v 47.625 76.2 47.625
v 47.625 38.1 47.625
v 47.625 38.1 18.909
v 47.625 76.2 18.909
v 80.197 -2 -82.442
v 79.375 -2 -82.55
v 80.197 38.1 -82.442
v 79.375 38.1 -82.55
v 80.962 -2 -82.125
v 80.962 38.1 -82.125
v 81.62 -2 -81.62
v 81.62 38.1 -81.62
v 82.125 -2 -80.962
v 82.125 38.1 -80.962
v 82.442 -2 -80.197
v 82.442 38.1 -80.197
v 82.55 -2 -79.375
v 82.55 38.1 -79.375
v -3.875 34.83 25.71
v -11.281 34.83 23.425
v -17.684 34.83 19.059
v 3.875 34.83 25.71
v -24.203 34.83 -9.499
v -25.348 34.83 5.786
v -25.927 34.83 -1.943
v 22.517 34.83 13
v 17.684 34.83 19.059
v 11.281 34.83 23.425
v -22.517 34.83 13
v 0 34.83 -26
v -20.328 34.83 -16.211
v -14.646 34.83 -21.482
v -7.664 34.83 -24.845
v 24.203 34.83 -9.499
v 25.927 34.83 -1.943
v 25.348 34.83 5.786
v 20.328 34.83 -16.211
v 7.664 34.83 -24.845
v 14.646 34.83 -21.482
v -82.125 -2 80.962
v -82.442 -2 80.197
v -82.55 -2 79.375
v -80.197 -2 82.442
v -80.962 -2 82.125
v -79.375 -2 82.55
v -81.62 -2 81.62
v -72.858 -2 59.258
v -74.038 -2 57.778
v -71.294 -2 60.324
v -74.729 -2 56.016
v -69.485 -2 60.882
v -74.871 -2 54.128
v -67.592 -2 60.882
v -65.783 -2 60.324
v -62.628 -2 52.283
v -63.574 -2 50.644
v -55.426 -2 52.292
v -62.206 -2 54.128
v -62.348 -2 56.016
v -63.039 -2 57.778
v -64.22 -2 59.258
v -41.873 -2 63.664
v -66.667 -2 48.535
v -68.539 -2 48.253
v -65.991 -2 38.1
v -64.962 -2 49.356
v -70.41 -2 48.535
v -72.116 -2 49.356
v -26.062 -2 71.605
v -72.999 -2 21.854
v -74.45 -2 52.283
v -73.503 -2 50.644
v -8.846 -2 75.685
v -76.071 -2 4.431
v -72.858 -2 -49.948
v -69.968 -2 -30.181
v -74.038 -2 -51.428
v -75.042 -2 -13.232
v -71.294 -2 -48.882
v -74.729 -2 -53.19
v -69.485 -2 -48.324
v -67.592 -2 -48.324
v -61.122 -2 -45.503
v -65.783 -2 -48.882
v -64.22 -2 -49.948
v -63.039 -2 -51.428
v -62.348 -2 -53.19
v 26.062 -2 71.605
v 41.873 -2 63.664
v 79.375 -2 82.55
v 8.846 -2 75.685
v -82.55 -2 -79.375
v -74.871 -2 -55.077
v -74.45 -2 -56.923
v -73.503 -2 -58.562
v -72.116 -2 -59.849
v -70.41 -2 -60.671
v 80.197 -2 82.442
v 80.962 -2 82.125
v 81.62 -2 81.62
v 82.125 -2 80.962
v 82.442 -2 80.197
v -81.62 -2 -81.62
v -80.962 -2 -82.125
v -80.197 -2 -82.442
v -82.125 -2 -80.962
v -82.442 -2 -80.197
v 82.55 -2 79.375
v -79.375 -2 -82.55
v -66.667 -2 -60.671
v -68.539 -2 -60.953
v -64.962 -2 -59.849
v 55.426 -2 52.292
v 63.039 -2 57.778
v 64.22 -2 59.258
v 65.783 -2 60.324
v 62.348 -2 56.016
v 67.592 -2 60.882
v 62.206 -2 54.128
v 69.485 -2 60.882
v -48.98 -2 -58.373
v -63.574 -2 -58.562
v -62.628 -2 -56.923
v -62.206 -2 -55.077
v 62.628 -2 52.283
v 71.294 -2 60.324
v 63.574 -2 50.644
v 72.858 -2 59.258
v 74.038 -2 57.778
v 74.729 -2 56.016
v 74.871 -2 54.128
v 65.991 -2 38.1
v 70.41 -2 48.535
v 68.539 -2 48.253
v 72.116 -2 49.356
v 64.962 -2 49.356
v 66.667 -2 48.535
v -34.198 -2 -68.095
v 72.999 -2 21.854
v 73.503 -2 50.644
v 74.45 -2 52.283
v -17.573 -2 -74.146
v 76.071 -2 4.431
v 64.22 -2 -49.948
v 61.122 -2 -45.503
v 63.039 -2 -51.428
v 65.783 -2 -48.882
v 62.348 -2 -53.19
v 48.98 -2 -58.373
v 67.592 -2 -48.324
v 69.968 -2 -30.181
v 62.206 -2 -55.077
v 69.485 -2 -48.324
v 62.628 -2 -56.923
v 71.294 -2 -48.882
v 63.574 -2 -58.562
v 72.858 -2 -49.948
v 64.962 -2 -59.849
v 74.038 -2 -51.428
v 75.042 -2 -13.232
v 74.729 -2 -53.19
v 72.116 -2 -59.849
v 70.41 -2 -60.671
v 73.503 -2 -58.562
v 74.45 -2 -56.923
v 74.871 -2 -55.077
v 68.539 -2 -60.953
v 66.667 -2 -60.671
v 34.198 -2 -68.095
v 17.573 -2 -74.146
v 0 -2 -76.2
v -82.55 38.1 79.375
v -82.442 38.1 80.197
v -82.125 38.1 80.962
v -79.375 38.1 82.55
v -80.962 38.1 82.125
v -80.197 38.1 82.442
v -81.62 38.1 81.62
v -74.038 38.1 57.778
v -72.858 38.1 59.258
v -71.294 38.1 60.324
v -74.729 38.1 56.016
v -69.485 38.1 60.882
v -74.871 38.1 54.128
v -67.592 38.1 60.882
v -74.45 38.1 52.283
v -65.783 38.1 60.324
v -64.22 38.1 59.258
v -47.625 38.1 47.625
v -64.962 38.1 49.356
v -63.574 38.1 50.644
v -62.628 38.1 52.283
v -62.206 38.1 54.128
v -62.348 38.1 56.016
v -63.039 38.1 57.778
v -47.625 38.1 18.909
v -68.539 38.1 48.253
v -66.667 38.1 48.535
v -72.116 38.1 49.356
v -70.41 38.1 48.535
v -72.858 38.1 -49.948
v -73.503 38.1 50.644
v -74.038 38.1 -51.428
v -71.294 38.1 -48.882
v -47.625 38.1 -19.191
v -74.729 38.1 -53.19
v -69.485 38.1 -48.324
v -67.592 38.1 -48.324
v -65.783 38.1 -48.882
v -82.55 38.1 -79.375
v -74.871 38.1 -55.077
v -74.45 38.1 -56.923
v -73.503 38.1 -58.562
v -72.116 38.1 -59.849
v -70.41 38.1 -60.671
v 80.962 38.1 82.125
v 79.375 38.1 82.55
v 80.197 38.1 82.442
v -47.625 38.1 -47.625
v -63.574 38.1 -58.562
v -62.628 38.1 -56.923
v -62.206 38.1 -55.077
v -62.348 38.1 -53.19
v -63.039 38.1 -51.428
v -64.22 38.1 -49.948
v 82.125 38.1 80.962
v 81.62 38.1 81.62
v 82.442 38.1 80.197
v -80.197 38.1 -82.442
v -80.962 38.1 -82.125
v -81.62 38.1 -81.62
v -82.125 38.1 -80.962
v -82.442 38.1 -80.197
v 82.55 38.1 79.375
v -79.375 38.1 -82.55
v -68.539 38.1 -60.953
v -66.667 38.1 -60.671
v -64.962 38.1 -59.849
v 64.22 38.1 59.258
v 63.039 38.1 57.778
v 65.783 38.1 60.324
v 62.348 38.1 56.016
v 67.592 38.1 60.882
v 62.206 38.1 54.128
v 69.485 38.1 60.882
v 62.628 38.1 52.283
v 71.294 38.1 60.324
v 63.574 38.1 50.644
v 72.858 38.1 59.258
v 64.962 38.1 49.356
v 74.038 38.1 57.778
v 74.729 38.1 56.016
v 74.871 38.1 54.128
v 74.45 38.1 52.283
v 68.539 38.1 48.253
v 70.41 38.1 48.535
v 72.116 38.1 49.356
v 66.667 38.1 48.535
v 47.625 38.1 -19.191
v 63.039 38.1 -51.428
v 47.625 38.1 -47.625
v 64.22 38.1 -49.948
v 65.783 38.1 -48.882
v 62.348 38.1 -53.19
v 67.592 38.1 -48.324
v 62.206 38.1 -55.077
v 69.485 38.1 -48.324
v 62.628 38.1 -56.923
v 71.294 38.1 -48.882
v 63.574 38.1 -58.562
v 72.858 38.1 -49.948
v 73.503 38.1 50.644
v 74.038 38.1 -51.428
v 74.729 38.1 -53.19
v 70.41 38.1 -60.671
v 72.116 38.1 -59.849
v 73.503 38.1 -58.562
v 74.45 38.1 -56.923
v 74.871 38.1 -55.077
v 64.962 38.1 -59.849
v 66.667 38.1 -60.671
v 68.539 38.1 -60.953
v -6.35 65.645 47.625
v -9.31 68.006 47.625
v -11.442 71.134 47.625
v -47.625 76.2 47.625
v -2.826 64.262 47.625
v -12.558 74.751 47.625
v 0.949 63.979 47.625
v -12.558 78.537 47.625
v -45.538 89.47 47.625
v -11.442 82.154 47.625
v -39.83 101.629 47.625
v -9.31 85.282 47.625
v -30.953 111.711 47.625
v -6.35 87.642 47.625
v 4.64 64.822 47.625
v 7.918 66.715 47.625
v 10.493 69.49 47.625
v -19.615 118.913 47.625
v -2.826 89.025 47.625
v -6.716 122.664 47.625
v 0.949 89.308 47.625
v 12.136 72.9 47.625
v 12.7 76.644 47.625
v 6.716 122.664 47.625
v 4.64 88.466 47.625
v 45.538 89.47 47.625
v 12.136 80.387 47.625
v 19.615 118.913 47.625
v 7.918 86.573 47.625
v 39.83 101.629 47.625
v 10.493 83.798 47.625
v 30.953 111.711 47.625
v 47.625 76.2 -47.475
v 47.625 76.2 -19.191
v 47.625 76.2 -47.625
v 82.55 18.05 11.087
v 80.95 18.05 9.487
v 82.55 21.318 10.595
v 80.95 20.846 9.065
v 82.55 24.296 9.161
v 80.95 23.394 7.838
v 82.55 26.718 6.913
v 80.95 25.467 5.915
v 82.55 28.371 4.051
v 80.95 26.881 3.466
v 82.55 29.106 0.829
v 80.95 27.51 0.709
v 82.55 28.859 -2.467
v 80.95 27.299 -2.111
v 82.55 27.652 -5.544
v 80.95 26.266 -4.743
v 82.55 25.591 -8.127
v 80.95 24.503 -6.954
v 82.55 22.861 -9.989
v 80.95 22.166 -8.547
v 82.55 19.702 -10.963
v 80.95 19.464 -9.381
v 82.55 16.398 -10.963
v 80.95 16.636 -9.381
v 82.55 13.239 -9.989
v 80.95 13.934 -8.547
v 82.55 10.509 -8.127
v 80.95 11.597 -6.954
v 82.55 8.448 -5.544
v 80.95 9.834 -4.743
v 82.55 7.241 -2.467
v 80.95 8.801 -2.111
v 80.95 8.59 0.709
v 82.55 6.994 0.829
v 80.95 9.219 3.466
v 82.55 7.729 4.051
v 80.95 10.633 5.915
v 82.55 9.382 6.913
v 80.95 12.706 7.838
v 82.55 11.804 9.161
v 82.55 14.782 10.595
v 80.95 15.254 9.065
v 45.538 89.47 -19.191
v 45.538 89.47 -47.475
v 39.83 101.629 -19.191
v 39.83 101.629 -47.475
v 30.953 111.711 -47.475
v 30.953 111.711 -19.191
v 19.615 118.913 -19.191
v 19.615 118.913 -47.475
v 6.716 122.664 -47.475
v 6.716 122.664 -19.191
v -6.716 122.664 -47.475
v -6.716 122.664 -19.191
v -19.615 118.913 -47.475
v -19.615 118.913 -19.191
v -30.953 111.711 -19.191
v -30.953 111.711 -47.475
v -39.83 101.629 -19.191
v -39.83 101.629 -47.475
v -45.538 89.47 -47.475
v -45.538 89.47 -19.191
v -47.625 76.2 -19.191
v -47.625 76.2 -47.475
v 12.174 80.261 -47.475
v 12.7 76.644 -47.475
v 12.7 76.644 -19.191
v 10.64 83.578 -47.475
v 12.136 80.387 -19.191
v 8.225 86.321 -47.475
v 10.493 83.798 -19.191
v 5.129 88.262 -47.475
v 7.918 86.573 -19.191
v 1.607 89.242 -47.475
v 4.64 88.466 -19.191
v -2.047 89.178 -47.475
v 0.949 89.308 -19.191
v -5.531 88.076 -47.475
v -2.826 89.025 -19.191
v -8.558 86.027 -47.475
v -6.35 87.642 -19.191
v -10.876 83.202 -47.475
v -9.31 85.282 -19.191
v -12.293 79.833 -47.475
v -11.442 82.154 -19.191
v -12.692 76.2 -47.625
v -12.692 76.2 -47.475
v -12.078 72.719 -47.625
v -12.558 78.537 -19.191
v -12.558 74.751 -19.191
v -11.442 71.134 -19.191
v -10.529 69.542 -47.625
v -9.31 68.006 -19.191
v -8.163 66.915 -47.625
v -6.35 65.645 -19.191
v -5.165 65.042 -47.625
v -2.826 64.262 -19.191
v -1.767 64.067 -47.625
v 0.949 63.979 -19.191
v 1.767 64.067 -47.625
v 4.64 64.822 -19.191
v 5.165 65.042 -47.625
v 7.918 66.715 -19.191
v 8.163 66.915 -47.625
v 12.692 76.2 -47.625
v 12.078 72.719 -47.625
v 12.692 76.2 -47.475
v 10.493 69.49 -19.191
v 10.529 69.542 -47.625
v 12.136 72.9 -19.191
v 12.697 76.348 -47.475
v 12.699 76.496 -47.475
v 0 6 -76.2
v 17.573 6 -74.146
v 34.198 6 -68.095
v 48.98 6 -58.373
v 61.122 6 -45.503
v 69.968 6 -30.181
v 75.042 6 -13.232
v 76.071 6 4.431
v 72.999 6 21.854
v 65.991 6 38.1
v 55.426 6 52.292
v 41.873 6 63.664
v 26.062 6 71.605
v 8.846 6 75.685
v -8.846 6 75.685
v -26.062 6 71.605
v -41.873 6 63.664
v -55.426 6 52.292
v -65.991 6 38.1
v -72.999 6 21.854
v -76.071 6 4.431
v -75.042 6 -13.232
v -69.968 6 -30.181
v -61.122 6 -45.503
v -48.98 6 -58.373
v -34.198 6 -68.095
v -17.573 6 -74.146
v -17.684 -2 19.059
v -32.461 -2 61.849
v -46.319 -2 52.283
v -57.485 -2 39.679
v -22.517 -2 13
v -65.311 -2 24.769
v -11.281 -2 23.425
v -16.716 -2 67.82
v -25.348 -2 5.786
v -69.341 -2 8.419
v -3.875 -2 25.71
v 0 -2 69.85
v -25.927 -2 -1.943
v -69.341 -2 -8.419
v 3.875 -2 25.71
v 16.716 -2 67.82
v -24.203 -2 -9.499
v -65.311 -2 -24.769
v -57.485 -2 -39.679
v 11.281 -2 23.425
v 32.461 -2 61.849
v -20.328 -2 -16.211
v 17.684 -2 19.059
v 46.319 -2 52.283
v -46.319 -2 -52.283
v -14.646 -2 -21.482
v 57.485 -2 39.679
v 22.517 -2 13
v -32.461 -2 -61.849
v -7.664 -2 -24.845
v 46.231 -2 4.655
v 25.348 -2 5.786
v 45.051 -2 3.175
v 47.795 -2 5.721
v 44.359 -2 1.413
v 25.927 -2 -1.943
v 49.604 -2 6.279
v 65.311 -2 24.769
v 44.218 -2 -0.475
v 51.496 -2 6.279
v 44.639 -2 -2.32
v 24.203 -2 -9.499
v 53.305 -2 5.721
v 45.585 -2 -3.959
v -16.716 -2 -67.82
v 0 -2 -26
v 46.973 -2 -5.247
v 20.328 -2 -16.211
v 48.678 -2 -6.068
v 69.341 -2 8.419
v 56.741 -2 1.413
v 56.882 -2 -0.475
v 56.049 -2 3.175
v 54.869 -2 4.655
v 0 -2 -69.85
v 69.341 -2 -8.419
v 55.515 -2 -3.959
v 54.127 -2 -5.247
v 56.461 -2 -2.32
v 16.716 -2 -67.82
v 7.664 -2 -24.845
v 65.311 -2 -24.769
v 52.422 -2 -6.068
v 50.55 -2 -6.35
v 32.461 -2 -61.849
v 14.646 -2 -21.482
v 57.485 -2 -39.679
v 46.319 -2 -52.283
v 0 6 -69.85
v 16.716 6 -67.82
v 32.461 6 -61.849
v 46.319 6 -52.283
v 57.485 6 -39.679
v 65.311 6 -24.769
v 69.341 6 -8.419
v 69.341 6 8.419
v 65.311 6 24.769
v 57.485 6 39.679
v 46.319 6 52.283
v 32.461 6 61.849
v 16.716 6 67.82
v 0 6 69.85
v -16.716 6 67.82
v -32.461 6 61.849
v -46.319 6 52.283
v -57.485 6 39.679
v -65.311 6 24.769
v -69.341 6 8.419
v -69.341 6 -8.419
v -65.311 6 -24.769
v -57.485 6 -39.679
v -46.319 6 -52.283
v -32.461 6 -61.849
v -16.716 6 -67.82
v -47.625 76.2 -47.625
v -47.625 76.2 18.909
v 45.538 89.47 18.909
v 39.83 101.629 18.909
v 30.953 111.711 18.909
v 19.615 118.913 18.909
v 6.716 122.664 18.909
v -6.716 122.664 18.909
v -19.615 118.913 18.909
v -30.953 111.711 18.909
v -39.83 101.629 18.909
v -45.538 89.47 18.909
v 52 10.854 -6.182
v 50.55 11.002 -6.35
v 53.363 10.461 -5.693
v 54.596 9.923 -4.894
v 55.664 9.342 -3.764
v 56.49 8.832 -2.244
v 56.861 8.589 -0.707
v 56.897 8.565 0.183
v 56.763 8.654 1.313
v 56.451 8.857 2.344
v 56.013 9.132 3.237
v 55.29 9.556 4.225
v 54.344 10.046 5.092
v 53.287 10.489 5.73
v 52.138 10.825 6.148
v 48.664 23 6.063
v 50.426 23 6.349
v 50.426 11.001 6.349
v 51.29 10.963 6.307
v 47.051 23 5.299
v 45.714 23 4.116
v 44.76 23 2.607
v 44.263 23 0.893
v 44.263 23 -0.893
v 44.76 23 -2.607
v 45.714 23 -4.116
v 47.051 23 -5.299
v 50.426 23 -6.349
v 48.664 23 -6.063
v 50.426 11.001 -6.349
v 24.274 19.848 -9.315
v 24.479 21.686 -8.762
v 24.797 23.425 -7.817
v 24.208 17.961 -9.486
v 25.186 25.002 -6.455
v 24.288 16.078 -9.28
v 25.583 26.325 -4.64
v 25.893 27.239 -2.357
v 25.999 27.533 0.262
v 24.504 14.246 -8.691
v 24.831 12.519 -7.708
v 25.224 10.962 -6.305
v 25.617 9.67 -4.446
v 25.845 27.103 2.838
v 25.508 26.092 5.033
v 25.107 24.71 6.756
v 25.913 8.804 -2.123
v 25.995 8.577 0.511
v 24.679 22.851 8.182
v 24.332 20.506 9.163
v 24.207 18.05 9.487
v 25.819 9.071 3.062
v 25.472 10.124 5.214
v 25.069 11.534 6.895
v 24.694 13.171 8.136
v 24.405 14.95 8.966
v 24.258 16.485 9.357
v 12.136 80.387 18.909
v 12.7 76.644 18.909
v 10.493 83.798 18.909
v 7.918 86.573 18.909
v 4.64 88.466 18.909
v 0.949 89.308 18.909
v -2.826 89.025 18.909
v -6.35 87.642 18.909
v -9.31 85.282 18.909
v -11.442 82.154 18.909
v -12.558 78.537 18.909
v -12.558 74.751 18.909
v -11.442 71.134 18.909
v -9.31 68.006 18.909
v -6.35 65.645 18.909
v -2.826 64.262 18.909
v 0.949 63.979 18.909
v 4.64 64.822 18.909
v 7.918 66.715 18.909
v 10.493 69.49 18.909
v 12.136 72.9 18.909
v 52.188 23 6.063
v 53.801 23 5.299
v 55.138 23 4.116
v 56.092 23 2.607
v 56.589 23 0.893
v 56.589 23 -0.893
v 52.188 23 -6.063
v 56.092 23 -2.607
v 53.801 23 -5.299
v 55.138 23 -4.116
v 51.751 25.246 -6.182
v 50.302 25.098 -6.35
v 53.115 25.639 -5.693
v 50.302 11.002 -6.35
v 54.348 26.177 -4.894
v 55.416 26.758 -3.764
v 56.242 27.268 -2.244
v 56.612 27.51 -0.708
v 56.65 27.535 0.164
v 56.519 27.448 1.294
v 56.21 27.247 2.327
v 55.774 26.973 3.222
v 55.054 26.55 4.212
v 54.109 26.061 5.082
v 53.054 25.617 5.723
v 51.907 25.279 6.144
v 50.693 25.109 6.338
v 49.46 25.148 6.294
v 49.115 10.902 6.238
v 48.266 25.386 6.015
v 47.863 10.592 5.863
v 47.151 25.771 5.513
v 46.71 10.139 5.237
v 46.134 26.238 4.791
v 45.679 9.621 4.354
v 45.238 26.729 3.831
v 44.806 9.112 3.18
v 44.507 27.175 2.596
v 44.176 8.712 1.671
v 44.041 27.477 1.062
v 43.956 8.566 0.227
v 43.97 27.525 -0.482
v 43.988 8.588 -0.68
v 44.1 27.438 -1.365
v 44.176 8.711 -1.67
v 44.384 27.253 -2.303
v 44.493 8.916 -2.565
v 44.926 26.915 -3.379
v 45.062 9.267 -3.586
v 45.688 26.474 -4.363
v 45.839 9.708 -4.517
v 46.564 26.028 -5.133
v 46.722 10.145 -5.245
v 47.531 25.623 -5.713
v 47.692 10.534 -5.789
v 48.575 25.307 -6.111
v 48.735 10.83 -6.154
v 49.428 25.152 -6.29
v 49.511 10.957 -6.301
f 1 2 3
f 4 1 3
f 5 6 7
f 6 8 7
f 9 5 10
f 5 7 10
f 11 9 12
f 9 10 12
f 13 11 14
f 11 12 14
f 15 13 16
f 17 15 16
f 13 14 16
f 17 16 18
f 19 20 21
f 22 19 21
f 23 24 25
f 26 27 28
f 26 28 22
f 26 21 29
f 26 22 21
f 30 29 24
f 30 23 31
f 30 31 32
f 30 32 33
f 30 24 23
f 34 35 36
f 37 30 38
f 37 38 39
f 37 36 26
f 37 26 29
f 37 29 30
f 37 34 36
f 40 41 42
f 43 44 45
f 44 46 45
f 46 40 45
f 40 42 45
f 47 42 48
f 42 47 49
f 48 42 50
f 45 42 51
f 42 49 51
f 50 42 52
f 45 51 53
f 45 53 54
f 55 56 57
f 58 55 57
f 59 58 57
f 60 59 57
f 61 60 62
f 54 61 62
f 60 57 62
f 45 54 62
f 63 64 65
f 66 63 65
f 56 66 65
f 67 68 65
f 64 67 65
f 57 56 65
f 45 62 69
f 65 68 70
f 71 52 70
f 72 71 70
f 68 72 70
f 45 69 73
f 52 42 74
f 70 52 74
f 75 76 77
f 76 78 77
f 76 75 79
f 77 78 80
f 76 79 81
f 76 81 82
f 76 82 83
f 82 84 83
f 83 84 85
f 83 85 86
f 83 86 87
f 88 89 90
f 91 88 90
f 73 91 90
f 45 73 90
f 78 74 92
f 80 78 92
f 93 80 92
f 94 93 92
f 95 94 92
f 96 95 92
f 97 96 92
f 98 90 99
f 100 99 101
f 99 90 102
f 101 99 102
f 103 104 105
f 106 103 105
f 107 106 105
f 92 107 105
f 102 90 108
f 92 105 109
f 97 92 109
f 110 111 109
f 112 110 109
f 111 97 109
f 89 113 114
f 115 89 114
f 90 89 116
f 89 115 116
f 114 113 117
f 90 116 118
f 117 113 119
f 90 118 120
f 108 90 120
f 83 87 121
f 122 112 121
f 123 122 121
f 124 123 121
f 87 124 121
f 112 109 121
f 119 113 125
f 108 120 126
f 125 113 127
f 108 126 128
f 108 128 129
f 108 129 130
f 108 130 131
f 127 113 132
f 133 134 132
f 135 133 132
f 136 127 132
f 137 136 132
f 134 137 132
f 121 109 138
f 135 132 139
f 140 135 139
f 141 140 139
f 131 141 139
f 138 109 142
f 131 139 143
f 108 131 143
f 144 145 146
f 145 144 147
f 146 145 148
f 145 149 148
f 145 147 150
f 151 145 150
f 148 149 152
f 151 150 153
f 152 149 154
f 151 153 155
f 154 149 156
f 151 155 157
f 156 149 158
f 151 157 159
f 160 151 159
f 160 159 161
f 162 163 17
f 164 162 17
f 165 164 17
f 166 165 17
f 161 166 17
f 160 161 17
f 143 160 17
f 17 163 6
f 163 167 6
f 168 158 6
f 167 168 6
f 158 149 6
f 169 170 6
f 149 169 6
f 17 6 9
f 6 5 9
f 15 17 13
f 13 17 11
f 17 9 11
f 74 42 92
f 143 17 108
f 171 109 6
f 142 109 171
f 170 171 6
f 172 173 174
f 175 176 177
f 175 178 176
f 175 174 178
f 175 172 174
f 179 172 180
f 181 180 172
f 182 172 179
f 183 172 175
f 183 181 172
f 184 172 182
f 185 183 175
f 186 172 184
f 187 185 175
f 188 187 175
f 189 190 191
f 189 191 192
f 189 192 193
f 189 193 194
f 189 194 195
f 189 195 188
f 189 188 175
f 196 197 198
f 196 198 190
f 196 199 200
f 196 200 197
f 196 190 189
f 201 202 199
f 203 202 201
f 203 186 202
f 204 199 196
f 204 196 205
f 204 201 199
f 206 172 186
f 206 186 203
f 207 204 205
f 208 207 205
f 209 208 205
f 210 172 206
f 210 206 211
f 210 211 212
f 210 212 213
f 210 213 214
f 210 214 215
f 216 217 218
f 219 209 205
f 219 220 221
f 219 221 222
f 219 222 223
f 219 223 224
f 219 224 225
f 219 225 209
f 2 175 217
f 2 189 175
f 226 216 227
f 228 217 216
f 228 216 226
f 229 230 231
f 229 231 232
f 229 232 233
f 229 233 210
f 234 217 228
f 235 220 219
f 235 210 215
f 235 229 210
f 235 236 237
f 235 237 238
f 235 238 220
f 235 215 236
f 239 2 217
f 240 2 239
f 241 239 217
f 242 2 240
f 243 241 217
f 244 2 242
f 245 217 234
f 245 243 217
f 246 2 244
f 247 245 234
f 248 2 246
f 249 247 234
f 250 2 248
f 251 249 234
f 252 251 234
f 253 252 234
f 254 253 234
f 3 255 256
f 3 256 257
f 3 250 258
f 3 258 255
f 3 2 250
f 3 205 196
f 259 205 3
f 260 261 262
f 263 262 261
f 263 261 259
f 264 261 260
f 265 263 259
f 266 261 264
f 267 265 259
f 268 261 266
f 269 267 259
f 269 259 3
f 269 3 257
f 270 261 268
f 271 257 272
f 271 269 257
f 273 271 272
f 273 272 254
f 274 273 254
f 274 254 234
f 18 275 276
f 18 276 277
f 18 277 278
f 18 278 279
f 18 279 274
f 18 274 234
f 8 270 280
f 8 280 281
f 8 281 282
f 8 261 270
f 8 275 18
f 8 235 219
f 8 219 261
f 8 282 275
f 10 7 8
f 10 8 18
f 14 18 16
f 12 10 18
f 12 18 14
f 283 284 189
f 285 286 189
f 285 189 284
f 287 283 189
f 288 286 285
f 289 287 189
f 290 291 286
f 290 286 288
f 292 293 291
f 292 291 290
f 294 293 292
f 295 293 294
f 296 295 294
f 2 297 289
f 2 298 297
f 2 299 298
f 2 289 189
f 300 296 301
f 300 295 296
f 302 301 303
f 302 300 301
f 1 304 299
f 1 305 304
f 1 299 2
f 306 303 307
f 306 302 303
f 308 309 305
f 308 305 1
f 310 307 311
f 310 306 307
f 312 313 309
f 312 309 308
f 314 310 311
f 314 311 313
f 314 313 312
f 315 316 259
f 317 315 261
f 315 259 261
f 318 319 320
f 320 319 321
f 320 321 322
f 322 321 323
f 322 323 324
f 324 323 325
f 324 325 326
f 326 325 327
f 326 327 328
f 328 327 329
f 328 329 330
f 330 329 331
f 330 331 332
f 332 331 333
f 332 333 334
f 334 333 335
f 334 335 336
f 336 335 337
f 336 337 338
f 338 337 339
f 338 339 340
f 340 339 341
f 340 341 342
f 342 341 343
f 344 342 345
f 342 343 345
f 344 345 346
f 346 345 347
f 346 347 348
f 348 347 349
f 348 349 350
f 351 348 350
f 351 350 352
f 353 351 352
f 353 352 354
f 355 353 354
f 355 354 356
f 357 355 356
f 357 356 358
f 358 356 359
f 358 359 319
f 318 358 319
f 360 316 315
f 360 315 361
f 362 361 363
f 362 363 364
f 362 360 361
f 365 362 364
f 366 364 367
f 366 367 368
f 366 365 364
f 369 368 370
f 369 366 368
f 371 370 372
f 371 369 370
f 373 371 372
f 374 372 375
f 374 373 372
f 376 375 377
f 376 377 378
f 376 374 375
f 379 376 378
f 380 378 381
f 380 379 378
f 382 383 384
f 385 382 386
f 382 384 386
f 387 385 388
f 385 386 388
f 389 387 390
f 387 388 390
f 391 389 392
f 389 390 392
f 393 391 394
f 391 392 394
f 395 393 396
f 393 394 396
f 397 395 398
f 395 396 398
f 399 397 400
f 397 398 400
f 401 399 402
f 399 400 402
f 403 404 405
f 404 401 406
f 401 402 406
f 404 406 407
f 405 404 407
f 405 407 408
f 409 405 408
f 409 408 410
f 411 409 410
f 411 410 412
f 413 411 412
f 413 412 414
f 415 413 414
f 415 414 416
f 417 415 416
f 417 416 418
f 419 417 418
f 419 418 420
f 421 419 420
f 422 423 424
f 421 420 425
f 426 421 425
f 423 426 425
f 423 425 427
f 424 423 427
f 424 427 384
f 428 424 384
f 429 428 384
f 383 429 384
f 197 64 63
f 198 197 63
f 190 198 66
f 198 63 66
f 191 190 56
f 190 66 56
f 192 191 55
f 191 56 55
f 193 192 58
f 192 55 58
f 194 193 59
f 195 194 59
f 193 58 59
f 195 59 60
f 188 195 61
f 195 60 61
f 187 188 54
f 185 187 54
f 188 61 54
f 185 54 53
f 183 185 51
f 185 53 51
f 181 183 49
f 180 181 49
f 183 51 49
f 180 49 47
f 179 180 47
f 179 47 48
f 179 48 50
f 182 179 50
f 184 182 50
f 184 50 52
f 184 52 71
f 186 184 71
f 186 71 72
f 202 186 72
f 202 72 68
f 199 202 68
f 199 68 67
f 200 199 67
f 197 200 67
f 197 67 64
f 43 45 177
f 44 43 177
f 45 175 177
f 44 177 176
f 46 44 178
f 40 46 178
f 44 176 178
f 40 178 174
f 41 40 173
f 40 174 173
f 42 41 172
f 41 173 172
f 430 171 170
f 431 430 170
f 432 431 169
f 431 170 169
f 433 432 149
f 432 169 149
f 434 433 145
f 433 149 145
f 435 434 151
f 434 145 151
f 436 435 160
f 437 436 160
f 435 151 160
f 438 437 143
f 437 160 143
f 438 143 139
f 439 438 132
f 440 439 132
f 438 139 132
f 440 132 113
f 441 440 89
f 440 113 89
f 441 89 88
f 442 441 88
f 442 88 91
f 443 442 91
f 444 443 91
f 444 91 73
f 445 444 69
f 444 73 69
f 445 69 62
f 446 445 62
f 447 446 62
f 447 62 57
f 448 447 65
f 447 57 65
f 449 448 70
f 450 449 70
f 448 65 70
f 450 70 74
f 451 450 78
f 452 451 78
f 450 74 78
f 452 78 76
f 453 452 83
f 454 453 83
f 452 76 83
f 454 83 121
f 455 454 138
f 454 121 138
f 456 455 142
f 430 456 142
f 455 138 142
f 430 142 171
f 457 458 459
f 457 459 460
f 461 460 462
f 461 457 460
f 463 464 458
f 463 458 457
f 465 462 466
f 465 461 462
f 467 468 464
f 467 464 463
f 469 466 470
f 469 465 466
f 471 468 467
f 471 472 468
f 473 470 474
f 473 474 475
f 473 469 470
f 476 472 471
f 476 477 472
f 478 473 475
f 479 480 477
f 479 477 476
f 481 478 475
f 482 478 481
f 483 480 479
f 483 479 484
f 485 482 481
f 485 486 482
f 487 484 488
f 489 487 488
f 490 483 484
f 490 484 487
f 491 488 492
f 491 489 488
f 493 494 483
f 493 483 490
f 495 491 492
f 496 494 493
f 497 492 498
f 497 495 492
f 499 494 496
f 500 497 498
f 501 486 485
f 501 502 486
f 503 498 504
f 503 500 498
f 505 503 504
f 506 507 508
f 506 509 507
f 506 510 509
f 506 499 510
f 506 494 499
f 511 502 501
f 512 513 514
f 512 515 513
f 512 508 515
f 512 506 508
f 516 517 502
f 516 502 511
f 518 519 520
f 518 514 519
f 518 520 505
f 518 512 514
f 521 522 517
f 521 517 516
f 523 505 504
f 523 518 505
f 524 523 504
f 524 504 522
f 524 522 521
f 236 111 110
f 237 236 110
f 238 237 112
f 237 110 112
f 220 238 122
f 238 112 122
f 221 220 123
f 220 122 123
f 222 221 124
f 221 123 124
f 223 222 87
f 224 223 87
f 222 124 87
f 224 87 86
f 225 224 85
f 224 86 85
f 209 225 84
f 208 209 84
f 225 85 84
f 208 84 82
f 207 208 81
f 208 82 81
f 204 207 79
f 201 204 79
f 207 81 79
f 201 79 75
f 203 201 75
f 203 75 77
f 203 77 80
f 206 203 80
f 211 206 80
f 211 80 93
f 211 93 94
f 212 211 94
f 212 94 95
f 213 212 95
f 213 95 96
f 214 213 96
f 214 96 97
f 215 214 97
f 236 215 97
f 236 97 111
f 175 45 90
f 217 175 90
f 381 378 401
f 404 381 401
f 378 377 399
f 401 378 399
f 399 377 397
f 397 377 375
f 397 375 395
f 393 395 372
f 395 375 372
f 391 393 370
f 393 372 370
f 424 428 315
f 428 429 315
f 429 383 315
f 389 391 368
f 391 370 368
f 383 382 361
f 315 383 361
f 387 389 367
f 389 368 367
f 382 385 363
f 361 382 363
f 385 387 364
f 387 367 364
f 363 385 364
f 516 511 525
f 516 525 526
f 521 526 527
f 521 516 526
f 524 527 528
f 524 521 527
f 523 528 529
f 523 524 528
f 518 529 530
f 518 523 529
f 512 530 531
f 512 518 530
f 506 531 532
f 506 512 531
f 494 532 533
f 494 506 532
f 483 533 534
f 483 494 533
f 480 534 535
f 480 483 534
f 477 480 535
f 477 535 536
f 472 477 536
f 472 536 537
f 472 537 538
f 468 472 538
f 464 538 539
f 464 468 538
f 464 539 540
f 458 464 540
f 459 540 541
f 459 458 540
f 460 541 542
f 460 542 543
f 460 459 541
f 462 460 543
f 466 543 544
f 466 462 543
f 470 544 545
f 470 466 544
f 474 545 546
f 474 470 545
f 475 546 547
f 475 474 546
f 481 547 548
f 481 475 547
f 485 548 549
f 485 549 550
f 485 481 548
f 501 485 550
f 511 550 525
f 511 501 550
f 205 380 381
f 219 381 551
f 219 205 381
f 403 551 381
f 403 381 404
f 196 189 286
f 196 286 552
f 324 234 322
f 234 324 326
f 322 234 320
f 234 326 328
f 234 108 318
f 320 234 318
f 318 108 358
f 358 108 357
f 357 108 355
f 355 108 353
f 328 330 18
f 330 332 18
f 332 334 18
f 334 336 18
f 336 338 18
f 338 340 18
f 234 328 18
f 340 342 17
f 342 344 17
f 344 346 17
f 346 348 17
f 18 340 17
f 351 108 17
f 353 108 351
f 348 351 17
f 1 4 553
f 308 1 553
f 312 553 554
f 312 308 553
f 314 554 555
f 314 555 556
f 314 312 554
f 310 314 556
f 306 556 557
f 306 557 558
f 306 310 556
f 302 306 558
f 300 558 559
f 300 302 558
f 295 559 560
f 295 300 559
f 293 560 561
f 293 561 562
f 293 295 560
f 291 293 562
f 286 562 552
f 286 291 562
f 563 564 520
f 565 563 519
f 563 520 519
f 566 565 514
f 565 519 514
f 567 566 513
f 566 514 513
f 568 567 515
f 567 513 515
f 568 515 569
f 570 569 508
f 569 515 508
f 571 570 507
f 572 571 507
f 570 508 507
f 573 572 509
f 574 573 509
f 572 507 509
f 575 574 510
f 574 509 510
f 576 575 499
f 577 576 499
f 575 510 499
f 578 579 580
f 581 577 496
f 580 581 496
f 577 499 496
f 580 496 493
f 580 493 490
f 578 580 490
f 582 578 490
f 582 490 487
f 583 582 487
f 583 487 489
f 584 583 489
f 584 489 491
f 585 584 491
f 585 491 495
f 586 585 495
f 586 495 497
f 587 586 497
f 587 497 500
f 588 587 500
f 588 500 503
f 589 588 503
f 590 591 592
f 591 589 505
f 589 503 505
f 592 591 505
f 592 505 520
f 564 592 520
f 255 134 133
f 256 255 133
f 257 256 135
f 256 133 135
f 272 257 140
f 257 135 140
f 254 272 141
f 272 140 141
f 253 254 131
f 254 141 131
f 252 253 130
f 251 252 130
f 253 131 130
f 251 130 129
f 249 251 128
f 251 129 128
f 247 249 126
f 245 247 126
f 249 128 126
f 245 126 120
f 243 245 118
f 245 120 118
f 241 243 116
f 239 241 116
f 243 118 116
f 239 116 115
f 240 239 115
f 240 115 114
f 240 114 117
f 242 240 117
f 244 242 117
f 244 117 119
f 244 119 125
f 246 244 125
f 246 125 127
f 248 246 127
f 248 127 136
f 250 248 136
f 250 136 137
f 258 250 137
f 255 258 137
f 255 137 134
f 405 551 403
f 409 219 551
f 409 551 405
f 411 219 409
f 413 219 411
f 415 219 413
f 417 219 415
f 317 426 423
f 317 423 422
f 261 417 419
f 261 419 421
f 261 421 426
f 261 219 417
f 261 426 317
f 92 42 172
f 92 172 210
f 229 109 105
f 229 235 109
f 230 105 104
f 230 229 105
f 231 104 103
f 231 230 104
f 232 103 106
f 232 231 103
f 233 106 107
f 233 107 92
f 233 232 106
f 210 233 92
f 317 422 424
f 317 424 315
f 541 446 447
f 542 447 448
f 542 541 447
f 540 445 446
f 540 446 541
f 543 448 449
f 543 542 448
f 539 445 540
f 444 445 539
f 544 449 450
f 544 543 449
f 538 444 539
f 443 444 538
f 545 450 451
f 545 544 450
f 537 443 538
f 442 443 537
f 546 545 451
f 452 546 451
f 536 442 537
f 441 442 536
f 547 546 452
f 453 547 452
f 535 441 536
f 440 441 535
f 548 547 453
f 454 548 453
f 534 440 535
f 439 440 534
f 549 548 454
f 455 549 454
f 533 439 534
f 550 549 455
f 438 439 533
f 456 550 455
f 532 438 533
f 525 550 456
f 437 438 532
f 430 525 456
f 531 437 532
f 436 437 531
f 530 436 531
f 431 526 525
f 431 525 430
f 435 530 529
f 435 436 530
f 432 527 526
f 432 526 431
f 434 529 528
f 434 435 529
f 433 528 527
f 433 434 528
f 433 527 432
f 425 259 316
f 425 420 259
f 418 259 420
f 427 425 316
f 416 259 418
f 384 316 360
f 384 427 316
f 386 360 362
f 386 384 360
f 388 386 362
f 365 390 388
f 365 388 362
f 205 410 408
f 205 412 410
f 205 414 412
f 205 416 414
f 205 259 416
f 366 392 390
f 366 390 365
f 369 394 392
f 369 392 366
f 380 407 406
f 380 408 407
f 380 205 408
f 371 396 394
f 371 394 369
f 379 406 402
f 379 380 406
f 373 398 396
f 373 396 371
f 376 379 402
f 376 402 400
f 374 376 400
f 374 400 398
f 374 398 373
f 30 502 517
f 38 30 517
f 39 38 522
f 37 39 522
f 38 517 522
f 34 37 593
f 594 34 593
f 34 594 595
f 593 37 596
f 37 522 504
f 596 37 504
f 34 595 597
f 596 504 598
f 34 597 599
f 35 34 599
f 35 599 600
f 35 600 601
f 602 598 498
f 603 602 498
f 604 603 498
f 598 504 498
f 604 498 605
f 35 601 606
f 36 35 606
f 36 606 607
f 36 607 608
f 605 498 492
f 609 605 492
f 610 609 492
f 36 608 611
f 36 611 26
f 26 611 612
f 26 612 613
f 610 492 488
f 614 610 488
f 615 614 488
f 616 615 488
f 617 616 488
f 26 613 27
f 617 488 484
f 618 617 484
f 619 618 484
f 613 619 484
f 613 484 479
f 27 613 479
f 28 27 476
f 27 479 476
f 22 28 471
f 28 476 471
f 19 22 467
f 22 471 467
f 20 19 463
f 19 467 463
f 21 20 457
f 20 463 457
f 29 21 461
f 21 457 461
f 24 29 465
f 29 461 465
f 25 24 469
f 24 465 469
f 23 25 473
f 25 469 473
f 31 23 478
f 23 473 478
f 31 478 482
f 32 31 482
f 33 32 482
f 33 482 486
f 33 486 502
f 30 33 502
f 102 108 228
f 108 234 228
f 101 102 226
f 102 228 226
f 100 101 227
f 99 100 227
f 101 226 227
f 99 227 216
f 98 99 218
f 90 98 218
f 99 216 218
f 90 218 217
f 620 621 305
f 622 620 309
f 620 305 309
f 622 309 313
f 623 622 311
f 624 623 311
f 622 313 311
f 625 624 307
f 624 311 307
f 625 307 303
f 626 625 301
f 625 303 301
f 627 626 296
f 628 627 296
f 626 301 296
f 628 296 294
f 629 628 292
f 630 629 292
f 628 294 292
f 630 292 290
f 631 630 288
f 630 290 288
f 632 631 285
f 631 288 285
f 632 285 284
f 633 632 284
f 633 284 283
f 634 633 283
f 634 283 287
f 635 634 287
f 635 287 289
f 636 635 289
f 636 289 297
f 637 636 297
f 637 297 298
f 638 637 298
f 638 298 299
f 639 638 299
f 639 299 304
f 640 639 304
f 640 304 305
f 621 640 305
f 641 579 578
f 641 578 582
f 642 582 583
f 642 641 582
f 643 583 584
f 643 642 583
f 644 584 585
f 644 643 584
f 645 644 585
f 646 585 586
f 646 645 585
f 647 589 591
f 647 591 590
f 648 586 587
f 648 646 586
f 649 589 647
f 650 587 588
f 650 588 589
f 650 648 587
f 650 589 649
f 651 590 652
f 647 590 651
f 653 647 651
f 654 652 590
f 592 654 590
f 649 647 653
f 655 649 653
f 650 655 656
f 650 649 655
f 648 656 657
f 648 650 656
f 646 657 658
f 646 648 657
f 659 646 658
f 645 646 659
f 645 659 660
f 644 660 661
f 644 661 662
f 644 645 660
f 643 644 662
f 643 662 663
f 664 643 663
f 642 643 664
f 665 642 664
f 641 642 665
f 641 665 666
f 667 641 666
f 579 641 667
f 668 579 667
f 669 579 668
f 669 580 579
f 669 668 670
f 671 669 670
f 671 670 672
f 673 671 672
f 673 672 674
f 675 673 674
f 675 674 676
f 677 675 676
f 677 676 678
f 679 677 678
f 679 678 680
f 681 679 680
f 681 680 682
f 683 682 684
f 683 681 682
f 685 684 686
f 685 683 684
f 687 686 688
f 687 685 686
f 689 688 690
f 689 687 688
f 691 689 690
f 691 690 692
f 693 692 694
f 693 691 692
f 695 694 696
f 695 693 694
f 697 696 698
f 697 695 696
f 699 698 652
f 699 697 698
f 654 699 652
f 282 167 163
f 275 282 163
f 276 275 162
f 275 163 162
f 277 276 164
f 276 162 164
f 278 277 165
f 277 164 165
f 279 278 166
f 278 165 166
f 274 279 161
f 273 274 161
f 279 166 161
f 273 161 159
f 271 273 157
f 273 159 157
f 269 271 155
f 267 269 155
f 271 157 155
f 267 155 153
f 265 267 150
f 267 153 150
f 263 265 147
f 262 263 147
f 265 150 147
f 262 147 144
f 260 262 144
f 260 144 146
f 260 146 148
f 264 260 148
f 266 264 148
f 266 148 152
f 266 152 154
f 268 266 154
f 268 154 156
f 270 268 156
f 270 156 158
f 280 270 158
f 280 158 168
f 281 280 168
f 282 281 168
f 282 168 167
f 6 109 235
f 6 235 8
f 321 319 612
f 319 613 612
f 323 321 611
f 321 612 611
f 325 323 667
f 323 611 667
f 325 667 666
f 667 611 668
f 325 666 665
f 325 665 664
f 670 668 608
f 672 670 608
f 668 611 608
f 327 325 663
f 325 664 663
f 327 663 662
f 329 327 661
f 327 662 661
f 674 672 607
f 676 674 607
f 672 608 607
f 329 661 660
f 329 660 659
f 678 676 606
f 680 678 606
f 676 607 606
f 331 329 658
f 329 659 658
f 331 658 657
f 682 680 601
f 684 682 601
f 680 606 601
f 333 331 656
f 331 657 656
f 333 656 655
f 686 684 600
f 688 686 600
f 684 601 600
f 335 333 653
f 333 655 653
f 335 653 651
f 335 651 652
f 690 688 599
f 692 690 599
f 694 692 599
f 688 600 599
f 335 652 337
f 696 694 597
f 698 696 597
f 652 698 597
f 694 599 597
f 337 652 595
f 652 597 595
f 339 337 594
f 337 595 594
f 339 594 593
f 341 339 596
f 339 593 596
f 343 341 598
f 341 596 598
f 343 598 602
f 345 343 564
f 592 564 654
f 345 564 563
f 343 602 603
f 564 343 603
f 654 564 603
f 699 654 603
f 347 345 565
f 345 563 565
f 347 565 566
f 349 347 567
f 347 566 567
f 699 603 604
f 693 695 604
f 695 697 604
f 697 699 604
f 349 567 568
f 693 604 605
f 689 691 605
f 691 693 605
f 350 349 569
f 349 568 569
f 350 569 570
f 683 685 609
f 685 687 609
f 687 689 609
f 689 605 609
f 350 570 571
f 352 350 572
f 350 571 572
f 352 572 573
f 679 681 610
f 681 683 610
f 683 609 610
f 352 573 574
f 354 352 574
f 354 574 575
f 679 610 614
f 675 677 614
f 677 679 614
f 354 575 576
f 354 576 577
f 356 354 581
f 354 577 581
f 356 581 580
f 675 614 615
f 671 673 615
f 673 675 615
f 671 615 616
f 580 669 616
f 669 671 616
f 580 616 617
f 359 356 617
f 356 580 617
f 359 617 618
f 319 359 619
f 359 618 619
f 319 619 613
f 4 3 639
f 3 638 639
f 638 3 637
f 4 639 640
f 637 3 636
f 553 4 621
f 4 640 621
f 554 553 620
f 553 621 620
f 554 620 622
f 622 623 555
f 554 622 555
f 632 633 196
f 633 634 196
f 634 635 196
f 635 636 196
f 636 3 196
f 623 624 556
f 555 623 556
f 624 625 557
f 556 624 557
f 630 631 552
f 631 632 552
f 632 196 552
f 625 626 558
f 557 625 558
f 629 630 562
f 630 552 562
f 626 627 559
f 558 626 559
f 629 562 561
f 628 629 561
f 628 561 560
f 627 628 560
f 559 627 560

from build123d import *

# Parameters (mm, degrees)
BOSS_EXTRUDE1_DEPTH                    = 38.1
BOSS_EXTRUDE1_DEPTH_BACK               = 2
SKETCH1_W                              = 165.1
SKETCH1_H                              = 165.1
SKETCH2_W                              = 95.25
SKETCH2_H                              = 95.25
BOSS_EXTRUDE2_DEPTH                    = 38.1
BOSS_EXTRUDE5_DEPTH                    = 95.1
SKETCH5_R                              = 12.7
CUT_EXTRUDE1_DEPTH                     = 198.290297523
SKETCH6_W                              = 38.1
SKETCH6_H                              = 85.0398732
CUT_EXTRUDE2_DEPTH                     = 198.290297523
FILLET1_R                              = 3.175
SKETCH7_R                              = 26
CUT_EXTRUDE3_DEPTH                     = 36.83
SKETCH8_R                              = 76.2
SKETCH8_R_2                            = 69.85
CUT_EXTRUDE4_DEPTH                     = 8
F_1_2_14_NPSM_TAPPED_HOLE1_D           = 18.9738
F_1_2_14_NPSM_TAPPED_HOLE1_DEPTH       = 63.5
F_1_2_14_NPSM_TAPPED_HOLE1_CSINK_D     = 22.1742
F_1_2_14_NPSM_TAPPED_HOLE1_CSINK_ANGLE = 90
F_1_2_14_NPSM_TAPPED_HOLE1_TIP         = 5.700304607
SKETCH15_R                             = 6.35
BOSS_EXTRUDE6_DEPTH                    = 30
SKETCH16_R                             = 6.35
CUT_EXTRUDE5_DEPTH                     = 25
SKETCH17_R                             = 6.35
CUT_EXTRUDE6_DEPTH                     = 172.14027248


with BuildPart() as part:
    # Sketch1 → Boss-Extrude1 (new, two sides: drawn at the far end of the back side and taken through both)
    with BuildSketch(Plane(origin=(0, 0, 0), x_dir=(1, 0, 0), z_dir=(0, 1, 0)).offset(-BOSS_EXTRUDE1_DEPTH_BACK)):
        Rectangle(SKETCH1_W, SKETCH1_H)
    extrude(amount=BOSS_EXTRUDE1_DEPTH + BOSS_EXTRUDE1_DEPTH_BACK)

    # Sketch2 → Boss-Extrude2 (add)
    with BuildSketch(Plane(origin=(0, 38.1, 0), x_dir=(1, 0, 0), z_dir=(0, 1, 0))):
        Rectangle(SKETCH2_W, SKETCH2_H)
    extrude(amount=BOSS_EXTRUDE2_DEPTH)

    # Sketch4 → Boss-Extrude5 (add)
    with BuildSketch(Plane.XY.offset(47.625)):
        with BuildLine():
            Line((-47.625, 76.2), (47.625, 76.2))
            ThreePointArc((47.625, 76.2), (0, 123.1398732), (-47.625, 76.2))
        make_face()
    extrude(amount=-BOSS_EXTRUDE5_DEPTH)

    # Sketch5 → Cut-Extrude1 (cut, through all)
    with BuildSketch(Plane.XY.offset(47.625)):
        with Locations((0, 76.643842778)):
            Circle(SKETCH5_R)
    extrude(amount=-CUT_EXTRUDE1_DEPTH, mode=Mode.SUBTRACT)

    # Sketch6 → Cut-Extrude2 (cut, through all)
    with BuildSketch(Plane.ZY.offset(47.625)):
        with Locations((-0.1412698, 80.6199366)):
            Rectangle(SKETCH6_W, SKETCH6_H)
    extrude(amount=-CUT_EXTRUDE2_DEPTH, mode=Mode.SUBTRACT)

    # Fillet1
    fillet1_edges = [part.edges().sort_by_distance(p)[0] for p in [
        (82.55, 18.05, 82.55),
        (-82.55, 18.05, 82.55),
        (-82.55, 18.05, -82.55),
        (82.55, 18.05, -82.55),
    ]]
    fillet(fillet1_edges, radius=FILLET1_R)

    # Sketch7 → Cut-Extrude3 (cut)
    with BuildSketch(Plane.XZ.offset(2)):
        with Locations(Location((0, 0, 0), (0, 0, 270))):
            Circle(SKETCH7_R)
    extrude(amount=-CUT_EXTRUDE3_DEPTH, mode=Mode.SUBTRACT)

    # Sketch8 → Cut-Extrude4 (cut)
    with BuildSketch(Plane.XZ.offset(2)):
        with Locations(Location((0, 0, 0), (0, 0, 270))):
            Circle(SKETCH8_R)
        with Locations(Location((0, 0, 0), (0, 0, 270))):
            Circle(SKETCH8_R_2, mode=Mode.SUBTRACT)
    extrude(amount=-CUT_EXTRUDE4_DEPTH, mode=Mode.SUBTRACT)

    # 1/2-14 NPSM Tapped Hole1
    with Locations(Plane(origin=(82.55, 0, 0), x_dir=(0, 0, -1), z_dir=(1, 0, 0))):
        with Locations((0, 18.05)):
            CounterSinkHole(F_1_2_14_NPSM_TAPPED_HOLE1_D / 2, F_1_2_14_NPSM_TAPPED_HOLE1_CSINK_D / 2, depth=F_1_2_14_NPSM_TAPPED_HOLE1_DEPTH, counter_sink_angle=F_1_2_14_NPSM_TAPPED_HOLE1_CSINK_ANGLE)
            with Locations((0, 0, -(F_1_2_14_NPSM_TAPPED_HOLE1_DEPTH + F_1_2_14_NPSM_TAPPED_HOLE1_TIP / 2))):  # 118° drill point
                Cone(0, F_1_2_14_NPSM_TAPPED_HOLE1_D / 2, F_1_2_14_NPSM_TAPPED_HOLE1_TIP, mode=Mode.SUBTRACT)

    # Sketch15 → Boss-Extrude6 (add)
    with BuildSketch(Plane.XZ.offset(2)):
        with Locations(Location((50.301871098, 0, 0), (0, 0, 270))):
            Circle(SKETCH15_R)
    extrude(amount=-BOSS_EXTRUDE6_DEPTH)

    # Sketch16 → Cut-Extrude5 (cut)
    with BuildSketch(Plane.XZ.offset(2)):
        with Locations(Location((50.55, 0, 0), (0, 0, 270))):
            Circle(SKETCH16_R)
    extrude(amount=-CUT_EXTRUDE5_DEPTH, mode=Mode.SUBTRACT)

    # Sketch17 → Cut-Extrude6 (cut, through all)
    with BuildSketch(Plane.XZ.offset(2)):
        with Locations(Location((-68.538631425, 54.602865331, 0), (0, 0, 270))):
            Circle(SKETCH17_R)
        with Locations(Location((68.538631425, 54.602865331, 0), (0, 0, 270))):
            Circle(SKETCH17_R)
        with Locations(Location((-68.538631425, -54.602865331, 0), (0, 0, 270))):
            Circle(SKETCH17_R)
        with Locations(Location((68.538631425, -54.602865331, 0), (0, 0, 270))):
            Circle(SKETCH17_R)
    extrude(amount=-CUT_EXTRUDE6_DEPTH, mode=Mode.SUBTRACT)


solid = part.part
